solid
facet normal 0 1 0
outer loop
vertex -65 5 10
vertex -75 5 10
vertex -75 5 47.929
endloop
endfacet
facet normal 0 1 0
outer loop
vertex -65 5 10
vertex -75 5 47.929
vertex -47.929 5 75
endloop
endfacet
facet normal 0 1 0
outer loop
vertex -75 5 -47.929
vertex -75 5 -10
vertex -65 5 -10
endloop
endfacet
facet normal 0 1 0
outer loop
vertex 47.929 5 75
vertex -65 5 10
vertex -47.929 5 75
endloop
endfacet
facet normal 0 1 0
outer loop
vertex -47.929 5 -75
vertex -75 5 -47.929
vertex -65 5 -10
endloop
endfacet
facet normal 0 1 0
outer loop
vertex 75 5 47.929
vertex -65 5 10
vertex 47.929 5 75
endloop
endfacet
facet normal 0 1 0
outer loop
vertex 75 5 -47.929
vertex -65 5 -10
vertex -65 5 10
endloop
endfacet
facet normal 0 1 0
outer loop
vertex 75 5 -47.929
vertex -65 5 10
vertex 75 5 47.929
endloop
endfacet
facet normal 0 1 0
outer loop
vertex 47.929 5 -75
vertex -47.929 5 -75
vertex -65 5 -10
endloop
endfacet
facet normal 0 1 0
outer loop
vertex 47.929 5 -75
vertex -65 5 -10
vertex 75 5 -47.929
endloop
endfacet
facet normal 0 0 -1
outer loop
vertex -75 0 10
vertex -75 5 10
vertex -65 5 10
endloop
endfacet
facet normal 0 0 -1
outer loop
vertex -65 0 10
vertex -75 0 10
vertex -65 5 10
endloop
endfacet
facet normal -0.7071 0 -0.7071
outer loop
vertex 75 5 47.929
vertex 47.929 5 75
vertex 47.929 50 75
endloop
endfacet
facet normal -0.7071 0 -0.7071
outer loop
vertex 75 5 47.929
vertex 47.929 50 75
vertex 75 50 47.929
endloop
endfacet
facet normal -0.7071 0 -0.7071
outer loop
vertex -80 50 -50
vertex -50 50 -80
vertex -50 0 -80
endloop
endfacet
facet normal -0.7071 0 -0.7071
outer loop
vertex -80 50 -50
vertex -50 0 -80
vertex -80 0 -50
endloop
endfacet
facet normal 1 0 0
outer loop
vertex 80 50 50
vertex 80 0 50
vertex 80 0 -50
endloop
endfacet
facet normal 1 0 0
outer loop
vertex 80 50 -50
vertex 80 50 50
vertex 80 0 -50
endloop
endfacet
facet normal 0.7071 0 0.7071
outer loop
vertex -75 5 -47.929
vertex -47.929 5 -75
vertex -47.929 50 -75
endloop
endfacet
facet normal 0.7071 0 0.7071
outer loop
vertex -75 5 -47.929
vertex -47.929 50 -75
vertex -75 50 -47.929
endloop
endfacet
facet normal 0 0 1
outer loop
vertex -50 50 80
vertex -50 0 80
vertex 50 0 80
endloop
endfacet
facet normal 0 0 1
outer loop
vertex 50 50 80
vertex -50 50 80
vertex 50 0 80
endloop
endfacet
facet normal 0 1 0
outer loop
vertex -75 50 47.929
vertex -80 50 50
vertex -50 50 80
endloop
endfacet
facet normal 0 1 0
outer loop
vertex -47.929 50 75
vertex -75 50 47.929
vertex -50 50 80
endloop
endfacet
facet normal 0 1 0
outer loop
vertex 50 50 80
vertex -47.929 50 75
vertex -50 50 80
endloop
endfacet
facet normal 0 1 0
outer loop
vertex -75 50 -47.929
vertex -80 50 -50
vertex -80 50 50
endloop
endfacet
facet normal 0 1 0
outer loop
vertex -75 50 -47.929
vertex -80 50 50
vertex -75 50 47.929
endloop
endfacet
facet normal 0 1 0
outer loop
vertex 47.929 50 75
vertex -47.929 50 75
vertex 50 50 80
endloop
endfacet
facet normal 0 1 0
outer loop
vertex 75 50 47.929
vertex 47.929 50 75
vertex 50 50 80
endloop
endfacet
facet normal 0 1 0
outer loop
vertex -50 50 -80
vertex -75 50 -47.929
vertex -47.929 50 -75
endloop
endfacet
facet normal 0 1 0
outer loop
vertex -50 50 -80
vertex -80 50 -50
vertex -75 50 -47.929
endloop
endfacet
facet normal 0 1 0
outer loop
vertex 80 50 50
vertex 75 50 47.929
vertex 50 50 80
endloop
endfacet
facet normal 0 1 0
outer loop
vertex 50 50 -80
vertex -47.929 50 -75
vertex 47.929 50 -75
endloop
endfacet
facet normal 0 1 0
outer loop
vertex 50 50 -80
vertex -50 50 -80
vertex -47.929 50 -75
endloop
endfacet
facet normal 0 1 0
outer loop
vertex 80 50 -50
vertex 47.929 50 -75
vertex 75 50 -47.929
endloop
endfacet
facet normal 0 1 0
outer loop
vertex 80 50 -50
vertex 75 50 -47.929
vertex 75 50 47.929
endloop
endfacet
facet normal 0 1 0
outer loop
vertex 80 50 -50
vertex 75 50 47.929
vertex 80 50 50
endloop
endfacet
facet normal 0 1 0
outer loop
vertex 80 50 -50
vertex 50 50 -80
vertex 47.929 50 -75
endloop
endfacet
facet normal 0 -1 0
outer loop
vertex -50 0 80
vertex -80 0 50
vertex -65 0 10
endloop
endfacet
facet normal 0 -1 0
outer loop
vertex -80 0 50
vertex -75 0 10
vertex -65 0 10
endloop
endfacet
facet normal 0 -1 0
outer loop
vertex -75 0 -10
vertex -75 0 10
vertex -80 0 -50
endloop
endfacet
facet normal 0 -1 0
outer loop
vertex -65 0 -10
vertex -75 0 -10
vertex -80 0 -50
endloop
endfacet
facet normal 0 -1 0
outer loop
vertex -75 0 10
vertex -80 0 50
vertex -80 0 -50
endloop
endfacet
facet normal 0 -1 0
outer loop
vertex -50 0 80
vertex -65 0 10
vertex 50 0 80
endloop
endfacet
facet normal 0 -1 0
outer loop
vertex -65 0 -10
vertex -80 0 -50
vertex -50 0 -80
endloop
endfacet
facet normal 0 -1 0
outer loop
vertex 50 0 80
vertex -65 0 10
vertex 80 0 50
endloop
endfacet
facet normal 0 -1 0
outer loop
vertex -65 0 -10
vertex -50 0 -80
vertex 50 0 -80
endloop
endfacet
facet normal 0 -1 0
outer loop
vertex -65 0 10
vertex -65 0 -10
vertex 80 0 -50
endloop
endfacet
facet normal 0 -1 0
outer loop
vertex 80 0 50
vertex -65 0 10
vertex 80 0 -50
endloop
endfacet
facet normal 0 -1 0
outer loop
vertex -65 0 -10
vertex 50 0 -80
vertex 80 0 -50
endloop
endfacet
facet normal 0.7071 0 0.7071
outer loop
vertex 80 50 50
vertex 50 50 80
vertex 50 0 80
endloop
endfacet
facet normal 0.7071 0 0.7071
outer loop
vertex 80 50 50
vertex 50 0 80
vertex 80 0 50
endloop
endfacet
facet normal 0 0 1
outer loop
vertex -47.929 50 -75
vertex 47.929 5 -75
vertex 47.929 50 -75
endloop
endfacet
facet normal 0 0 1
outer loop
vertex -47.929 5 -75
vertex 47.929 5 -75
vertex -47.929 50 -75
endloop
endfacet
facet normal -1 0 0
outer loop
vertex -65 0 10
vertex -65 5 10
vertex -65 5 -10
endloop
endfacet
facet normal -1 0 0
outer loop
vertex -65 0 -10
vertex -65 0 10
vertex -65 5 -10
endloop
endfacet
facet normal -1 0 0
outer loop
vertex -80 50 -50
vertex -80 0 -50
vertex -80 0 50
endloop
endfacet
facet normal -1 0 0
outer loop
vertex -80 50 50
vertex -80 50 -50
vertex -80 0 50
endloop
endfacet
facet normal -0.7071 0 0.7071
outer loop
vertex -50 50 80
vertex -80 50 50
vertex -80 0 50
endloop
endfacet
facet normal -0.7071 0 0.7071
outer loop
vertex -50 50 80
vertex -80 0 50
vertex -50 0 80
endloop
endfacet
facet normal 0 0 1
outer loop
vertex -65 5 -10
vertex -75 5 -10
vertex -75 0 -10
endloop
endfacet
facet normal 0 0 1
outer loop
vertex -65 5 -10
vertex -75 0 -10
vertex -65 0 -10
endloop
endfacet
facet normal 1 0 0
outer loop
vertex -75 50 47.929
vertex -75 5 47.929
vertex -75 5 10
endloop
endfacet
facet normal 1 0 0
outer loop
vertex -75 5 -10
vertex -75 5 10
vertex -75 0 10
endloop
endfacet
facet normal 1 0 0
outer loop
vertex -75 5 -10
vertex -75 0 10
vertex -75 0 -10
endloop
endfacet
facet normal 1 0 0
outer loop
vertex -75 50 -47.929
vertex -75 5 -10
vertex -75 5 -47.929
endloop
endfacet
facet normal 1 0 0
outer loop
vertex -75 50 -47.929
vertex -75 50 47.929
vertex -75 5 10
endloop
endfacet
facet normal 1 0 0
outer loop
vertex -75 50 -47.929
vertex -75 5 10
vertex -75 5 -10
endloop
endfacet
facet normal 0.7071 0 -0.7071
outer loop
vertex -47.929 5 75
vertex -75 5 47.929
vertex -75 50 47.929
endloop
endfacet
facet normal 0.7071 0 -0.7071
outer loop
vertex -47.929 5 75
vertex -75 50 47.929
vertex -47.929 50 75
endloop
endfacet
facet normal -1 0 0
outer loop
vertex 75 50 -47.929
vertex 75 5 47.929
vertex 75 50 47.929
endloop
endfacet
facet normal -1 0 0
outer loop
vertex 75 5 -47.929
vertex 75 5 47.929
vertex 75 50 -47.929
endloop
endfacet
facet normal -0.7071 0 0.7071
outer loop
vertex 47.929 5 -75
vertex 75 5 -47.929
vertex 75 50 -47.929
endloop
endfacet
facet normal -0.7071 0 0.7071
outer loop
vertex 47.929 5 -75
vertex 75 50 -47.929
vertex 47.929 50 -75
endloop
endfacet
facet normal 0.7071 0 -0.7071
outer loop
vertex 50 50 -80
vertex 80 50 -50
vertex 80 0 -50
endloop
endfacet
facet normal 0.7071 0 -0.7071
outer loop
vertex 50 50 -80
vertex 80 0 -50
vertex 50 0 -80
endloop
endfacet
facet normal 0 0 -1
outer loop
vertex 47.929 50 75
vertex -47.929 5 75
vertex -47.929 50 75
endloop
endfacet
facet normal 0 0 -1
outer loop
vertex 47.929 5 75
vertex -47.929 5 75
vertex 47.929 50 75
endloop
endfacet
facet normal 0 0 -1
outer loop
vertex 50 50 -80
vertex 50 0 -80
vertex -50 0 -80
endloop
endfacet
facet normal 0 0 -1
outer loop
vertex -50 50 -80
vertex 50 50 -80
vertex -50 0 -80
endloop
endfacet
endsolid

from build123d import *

# Parameters (mm, degrees)
BOSS_EXTRUDE1_DEPTH = 50
SHELL1_T            = -5
SKETCH5_W           = 10
SKETCH5_H           = 20
CUT_EXTRUDE1_DEPTH  = 5


with BuildPart() as part:
    # Sketch1 → Boss-Extrude1 (new body)
    with BuildSketch(Plane(origin=(0, 0, 0), x_dir=(1, 0, 0), z_dir=(0, 1, 0))):
        Polygon((-50, 80), (-80, 50), (-80, -50), (-50, -80), (50, -80), (80, -50), (80, 50), (50, 80), align=None)
    extrude(amount=BOSS_EXTRUDE1_DEPTH)

    # Shell1
    shell1_openings = [part.faces().sort_by_distance(p)[0] for p in [
        (0, 50, 0),
    ]]
    offset(amount=SHELL1_T, openings=shell1_openings, kind=Kind.INTERSECTION)

    # Sketch5 → Cut-Extrude1 (cut)
    with BuildSketch(Plane(origin=(0, 5, 0), x_dir=(1, 0, 0), z_dir=(0, 1, 0))):
        with Locations((-70, 0)):
            Rectangle(SKETCH5_W, SKETCH5_H)
    extrude(amount=-CUT_EXTRUDE1_DEPTH, mode=Mode.SUBTRACT)


solid = part.part
